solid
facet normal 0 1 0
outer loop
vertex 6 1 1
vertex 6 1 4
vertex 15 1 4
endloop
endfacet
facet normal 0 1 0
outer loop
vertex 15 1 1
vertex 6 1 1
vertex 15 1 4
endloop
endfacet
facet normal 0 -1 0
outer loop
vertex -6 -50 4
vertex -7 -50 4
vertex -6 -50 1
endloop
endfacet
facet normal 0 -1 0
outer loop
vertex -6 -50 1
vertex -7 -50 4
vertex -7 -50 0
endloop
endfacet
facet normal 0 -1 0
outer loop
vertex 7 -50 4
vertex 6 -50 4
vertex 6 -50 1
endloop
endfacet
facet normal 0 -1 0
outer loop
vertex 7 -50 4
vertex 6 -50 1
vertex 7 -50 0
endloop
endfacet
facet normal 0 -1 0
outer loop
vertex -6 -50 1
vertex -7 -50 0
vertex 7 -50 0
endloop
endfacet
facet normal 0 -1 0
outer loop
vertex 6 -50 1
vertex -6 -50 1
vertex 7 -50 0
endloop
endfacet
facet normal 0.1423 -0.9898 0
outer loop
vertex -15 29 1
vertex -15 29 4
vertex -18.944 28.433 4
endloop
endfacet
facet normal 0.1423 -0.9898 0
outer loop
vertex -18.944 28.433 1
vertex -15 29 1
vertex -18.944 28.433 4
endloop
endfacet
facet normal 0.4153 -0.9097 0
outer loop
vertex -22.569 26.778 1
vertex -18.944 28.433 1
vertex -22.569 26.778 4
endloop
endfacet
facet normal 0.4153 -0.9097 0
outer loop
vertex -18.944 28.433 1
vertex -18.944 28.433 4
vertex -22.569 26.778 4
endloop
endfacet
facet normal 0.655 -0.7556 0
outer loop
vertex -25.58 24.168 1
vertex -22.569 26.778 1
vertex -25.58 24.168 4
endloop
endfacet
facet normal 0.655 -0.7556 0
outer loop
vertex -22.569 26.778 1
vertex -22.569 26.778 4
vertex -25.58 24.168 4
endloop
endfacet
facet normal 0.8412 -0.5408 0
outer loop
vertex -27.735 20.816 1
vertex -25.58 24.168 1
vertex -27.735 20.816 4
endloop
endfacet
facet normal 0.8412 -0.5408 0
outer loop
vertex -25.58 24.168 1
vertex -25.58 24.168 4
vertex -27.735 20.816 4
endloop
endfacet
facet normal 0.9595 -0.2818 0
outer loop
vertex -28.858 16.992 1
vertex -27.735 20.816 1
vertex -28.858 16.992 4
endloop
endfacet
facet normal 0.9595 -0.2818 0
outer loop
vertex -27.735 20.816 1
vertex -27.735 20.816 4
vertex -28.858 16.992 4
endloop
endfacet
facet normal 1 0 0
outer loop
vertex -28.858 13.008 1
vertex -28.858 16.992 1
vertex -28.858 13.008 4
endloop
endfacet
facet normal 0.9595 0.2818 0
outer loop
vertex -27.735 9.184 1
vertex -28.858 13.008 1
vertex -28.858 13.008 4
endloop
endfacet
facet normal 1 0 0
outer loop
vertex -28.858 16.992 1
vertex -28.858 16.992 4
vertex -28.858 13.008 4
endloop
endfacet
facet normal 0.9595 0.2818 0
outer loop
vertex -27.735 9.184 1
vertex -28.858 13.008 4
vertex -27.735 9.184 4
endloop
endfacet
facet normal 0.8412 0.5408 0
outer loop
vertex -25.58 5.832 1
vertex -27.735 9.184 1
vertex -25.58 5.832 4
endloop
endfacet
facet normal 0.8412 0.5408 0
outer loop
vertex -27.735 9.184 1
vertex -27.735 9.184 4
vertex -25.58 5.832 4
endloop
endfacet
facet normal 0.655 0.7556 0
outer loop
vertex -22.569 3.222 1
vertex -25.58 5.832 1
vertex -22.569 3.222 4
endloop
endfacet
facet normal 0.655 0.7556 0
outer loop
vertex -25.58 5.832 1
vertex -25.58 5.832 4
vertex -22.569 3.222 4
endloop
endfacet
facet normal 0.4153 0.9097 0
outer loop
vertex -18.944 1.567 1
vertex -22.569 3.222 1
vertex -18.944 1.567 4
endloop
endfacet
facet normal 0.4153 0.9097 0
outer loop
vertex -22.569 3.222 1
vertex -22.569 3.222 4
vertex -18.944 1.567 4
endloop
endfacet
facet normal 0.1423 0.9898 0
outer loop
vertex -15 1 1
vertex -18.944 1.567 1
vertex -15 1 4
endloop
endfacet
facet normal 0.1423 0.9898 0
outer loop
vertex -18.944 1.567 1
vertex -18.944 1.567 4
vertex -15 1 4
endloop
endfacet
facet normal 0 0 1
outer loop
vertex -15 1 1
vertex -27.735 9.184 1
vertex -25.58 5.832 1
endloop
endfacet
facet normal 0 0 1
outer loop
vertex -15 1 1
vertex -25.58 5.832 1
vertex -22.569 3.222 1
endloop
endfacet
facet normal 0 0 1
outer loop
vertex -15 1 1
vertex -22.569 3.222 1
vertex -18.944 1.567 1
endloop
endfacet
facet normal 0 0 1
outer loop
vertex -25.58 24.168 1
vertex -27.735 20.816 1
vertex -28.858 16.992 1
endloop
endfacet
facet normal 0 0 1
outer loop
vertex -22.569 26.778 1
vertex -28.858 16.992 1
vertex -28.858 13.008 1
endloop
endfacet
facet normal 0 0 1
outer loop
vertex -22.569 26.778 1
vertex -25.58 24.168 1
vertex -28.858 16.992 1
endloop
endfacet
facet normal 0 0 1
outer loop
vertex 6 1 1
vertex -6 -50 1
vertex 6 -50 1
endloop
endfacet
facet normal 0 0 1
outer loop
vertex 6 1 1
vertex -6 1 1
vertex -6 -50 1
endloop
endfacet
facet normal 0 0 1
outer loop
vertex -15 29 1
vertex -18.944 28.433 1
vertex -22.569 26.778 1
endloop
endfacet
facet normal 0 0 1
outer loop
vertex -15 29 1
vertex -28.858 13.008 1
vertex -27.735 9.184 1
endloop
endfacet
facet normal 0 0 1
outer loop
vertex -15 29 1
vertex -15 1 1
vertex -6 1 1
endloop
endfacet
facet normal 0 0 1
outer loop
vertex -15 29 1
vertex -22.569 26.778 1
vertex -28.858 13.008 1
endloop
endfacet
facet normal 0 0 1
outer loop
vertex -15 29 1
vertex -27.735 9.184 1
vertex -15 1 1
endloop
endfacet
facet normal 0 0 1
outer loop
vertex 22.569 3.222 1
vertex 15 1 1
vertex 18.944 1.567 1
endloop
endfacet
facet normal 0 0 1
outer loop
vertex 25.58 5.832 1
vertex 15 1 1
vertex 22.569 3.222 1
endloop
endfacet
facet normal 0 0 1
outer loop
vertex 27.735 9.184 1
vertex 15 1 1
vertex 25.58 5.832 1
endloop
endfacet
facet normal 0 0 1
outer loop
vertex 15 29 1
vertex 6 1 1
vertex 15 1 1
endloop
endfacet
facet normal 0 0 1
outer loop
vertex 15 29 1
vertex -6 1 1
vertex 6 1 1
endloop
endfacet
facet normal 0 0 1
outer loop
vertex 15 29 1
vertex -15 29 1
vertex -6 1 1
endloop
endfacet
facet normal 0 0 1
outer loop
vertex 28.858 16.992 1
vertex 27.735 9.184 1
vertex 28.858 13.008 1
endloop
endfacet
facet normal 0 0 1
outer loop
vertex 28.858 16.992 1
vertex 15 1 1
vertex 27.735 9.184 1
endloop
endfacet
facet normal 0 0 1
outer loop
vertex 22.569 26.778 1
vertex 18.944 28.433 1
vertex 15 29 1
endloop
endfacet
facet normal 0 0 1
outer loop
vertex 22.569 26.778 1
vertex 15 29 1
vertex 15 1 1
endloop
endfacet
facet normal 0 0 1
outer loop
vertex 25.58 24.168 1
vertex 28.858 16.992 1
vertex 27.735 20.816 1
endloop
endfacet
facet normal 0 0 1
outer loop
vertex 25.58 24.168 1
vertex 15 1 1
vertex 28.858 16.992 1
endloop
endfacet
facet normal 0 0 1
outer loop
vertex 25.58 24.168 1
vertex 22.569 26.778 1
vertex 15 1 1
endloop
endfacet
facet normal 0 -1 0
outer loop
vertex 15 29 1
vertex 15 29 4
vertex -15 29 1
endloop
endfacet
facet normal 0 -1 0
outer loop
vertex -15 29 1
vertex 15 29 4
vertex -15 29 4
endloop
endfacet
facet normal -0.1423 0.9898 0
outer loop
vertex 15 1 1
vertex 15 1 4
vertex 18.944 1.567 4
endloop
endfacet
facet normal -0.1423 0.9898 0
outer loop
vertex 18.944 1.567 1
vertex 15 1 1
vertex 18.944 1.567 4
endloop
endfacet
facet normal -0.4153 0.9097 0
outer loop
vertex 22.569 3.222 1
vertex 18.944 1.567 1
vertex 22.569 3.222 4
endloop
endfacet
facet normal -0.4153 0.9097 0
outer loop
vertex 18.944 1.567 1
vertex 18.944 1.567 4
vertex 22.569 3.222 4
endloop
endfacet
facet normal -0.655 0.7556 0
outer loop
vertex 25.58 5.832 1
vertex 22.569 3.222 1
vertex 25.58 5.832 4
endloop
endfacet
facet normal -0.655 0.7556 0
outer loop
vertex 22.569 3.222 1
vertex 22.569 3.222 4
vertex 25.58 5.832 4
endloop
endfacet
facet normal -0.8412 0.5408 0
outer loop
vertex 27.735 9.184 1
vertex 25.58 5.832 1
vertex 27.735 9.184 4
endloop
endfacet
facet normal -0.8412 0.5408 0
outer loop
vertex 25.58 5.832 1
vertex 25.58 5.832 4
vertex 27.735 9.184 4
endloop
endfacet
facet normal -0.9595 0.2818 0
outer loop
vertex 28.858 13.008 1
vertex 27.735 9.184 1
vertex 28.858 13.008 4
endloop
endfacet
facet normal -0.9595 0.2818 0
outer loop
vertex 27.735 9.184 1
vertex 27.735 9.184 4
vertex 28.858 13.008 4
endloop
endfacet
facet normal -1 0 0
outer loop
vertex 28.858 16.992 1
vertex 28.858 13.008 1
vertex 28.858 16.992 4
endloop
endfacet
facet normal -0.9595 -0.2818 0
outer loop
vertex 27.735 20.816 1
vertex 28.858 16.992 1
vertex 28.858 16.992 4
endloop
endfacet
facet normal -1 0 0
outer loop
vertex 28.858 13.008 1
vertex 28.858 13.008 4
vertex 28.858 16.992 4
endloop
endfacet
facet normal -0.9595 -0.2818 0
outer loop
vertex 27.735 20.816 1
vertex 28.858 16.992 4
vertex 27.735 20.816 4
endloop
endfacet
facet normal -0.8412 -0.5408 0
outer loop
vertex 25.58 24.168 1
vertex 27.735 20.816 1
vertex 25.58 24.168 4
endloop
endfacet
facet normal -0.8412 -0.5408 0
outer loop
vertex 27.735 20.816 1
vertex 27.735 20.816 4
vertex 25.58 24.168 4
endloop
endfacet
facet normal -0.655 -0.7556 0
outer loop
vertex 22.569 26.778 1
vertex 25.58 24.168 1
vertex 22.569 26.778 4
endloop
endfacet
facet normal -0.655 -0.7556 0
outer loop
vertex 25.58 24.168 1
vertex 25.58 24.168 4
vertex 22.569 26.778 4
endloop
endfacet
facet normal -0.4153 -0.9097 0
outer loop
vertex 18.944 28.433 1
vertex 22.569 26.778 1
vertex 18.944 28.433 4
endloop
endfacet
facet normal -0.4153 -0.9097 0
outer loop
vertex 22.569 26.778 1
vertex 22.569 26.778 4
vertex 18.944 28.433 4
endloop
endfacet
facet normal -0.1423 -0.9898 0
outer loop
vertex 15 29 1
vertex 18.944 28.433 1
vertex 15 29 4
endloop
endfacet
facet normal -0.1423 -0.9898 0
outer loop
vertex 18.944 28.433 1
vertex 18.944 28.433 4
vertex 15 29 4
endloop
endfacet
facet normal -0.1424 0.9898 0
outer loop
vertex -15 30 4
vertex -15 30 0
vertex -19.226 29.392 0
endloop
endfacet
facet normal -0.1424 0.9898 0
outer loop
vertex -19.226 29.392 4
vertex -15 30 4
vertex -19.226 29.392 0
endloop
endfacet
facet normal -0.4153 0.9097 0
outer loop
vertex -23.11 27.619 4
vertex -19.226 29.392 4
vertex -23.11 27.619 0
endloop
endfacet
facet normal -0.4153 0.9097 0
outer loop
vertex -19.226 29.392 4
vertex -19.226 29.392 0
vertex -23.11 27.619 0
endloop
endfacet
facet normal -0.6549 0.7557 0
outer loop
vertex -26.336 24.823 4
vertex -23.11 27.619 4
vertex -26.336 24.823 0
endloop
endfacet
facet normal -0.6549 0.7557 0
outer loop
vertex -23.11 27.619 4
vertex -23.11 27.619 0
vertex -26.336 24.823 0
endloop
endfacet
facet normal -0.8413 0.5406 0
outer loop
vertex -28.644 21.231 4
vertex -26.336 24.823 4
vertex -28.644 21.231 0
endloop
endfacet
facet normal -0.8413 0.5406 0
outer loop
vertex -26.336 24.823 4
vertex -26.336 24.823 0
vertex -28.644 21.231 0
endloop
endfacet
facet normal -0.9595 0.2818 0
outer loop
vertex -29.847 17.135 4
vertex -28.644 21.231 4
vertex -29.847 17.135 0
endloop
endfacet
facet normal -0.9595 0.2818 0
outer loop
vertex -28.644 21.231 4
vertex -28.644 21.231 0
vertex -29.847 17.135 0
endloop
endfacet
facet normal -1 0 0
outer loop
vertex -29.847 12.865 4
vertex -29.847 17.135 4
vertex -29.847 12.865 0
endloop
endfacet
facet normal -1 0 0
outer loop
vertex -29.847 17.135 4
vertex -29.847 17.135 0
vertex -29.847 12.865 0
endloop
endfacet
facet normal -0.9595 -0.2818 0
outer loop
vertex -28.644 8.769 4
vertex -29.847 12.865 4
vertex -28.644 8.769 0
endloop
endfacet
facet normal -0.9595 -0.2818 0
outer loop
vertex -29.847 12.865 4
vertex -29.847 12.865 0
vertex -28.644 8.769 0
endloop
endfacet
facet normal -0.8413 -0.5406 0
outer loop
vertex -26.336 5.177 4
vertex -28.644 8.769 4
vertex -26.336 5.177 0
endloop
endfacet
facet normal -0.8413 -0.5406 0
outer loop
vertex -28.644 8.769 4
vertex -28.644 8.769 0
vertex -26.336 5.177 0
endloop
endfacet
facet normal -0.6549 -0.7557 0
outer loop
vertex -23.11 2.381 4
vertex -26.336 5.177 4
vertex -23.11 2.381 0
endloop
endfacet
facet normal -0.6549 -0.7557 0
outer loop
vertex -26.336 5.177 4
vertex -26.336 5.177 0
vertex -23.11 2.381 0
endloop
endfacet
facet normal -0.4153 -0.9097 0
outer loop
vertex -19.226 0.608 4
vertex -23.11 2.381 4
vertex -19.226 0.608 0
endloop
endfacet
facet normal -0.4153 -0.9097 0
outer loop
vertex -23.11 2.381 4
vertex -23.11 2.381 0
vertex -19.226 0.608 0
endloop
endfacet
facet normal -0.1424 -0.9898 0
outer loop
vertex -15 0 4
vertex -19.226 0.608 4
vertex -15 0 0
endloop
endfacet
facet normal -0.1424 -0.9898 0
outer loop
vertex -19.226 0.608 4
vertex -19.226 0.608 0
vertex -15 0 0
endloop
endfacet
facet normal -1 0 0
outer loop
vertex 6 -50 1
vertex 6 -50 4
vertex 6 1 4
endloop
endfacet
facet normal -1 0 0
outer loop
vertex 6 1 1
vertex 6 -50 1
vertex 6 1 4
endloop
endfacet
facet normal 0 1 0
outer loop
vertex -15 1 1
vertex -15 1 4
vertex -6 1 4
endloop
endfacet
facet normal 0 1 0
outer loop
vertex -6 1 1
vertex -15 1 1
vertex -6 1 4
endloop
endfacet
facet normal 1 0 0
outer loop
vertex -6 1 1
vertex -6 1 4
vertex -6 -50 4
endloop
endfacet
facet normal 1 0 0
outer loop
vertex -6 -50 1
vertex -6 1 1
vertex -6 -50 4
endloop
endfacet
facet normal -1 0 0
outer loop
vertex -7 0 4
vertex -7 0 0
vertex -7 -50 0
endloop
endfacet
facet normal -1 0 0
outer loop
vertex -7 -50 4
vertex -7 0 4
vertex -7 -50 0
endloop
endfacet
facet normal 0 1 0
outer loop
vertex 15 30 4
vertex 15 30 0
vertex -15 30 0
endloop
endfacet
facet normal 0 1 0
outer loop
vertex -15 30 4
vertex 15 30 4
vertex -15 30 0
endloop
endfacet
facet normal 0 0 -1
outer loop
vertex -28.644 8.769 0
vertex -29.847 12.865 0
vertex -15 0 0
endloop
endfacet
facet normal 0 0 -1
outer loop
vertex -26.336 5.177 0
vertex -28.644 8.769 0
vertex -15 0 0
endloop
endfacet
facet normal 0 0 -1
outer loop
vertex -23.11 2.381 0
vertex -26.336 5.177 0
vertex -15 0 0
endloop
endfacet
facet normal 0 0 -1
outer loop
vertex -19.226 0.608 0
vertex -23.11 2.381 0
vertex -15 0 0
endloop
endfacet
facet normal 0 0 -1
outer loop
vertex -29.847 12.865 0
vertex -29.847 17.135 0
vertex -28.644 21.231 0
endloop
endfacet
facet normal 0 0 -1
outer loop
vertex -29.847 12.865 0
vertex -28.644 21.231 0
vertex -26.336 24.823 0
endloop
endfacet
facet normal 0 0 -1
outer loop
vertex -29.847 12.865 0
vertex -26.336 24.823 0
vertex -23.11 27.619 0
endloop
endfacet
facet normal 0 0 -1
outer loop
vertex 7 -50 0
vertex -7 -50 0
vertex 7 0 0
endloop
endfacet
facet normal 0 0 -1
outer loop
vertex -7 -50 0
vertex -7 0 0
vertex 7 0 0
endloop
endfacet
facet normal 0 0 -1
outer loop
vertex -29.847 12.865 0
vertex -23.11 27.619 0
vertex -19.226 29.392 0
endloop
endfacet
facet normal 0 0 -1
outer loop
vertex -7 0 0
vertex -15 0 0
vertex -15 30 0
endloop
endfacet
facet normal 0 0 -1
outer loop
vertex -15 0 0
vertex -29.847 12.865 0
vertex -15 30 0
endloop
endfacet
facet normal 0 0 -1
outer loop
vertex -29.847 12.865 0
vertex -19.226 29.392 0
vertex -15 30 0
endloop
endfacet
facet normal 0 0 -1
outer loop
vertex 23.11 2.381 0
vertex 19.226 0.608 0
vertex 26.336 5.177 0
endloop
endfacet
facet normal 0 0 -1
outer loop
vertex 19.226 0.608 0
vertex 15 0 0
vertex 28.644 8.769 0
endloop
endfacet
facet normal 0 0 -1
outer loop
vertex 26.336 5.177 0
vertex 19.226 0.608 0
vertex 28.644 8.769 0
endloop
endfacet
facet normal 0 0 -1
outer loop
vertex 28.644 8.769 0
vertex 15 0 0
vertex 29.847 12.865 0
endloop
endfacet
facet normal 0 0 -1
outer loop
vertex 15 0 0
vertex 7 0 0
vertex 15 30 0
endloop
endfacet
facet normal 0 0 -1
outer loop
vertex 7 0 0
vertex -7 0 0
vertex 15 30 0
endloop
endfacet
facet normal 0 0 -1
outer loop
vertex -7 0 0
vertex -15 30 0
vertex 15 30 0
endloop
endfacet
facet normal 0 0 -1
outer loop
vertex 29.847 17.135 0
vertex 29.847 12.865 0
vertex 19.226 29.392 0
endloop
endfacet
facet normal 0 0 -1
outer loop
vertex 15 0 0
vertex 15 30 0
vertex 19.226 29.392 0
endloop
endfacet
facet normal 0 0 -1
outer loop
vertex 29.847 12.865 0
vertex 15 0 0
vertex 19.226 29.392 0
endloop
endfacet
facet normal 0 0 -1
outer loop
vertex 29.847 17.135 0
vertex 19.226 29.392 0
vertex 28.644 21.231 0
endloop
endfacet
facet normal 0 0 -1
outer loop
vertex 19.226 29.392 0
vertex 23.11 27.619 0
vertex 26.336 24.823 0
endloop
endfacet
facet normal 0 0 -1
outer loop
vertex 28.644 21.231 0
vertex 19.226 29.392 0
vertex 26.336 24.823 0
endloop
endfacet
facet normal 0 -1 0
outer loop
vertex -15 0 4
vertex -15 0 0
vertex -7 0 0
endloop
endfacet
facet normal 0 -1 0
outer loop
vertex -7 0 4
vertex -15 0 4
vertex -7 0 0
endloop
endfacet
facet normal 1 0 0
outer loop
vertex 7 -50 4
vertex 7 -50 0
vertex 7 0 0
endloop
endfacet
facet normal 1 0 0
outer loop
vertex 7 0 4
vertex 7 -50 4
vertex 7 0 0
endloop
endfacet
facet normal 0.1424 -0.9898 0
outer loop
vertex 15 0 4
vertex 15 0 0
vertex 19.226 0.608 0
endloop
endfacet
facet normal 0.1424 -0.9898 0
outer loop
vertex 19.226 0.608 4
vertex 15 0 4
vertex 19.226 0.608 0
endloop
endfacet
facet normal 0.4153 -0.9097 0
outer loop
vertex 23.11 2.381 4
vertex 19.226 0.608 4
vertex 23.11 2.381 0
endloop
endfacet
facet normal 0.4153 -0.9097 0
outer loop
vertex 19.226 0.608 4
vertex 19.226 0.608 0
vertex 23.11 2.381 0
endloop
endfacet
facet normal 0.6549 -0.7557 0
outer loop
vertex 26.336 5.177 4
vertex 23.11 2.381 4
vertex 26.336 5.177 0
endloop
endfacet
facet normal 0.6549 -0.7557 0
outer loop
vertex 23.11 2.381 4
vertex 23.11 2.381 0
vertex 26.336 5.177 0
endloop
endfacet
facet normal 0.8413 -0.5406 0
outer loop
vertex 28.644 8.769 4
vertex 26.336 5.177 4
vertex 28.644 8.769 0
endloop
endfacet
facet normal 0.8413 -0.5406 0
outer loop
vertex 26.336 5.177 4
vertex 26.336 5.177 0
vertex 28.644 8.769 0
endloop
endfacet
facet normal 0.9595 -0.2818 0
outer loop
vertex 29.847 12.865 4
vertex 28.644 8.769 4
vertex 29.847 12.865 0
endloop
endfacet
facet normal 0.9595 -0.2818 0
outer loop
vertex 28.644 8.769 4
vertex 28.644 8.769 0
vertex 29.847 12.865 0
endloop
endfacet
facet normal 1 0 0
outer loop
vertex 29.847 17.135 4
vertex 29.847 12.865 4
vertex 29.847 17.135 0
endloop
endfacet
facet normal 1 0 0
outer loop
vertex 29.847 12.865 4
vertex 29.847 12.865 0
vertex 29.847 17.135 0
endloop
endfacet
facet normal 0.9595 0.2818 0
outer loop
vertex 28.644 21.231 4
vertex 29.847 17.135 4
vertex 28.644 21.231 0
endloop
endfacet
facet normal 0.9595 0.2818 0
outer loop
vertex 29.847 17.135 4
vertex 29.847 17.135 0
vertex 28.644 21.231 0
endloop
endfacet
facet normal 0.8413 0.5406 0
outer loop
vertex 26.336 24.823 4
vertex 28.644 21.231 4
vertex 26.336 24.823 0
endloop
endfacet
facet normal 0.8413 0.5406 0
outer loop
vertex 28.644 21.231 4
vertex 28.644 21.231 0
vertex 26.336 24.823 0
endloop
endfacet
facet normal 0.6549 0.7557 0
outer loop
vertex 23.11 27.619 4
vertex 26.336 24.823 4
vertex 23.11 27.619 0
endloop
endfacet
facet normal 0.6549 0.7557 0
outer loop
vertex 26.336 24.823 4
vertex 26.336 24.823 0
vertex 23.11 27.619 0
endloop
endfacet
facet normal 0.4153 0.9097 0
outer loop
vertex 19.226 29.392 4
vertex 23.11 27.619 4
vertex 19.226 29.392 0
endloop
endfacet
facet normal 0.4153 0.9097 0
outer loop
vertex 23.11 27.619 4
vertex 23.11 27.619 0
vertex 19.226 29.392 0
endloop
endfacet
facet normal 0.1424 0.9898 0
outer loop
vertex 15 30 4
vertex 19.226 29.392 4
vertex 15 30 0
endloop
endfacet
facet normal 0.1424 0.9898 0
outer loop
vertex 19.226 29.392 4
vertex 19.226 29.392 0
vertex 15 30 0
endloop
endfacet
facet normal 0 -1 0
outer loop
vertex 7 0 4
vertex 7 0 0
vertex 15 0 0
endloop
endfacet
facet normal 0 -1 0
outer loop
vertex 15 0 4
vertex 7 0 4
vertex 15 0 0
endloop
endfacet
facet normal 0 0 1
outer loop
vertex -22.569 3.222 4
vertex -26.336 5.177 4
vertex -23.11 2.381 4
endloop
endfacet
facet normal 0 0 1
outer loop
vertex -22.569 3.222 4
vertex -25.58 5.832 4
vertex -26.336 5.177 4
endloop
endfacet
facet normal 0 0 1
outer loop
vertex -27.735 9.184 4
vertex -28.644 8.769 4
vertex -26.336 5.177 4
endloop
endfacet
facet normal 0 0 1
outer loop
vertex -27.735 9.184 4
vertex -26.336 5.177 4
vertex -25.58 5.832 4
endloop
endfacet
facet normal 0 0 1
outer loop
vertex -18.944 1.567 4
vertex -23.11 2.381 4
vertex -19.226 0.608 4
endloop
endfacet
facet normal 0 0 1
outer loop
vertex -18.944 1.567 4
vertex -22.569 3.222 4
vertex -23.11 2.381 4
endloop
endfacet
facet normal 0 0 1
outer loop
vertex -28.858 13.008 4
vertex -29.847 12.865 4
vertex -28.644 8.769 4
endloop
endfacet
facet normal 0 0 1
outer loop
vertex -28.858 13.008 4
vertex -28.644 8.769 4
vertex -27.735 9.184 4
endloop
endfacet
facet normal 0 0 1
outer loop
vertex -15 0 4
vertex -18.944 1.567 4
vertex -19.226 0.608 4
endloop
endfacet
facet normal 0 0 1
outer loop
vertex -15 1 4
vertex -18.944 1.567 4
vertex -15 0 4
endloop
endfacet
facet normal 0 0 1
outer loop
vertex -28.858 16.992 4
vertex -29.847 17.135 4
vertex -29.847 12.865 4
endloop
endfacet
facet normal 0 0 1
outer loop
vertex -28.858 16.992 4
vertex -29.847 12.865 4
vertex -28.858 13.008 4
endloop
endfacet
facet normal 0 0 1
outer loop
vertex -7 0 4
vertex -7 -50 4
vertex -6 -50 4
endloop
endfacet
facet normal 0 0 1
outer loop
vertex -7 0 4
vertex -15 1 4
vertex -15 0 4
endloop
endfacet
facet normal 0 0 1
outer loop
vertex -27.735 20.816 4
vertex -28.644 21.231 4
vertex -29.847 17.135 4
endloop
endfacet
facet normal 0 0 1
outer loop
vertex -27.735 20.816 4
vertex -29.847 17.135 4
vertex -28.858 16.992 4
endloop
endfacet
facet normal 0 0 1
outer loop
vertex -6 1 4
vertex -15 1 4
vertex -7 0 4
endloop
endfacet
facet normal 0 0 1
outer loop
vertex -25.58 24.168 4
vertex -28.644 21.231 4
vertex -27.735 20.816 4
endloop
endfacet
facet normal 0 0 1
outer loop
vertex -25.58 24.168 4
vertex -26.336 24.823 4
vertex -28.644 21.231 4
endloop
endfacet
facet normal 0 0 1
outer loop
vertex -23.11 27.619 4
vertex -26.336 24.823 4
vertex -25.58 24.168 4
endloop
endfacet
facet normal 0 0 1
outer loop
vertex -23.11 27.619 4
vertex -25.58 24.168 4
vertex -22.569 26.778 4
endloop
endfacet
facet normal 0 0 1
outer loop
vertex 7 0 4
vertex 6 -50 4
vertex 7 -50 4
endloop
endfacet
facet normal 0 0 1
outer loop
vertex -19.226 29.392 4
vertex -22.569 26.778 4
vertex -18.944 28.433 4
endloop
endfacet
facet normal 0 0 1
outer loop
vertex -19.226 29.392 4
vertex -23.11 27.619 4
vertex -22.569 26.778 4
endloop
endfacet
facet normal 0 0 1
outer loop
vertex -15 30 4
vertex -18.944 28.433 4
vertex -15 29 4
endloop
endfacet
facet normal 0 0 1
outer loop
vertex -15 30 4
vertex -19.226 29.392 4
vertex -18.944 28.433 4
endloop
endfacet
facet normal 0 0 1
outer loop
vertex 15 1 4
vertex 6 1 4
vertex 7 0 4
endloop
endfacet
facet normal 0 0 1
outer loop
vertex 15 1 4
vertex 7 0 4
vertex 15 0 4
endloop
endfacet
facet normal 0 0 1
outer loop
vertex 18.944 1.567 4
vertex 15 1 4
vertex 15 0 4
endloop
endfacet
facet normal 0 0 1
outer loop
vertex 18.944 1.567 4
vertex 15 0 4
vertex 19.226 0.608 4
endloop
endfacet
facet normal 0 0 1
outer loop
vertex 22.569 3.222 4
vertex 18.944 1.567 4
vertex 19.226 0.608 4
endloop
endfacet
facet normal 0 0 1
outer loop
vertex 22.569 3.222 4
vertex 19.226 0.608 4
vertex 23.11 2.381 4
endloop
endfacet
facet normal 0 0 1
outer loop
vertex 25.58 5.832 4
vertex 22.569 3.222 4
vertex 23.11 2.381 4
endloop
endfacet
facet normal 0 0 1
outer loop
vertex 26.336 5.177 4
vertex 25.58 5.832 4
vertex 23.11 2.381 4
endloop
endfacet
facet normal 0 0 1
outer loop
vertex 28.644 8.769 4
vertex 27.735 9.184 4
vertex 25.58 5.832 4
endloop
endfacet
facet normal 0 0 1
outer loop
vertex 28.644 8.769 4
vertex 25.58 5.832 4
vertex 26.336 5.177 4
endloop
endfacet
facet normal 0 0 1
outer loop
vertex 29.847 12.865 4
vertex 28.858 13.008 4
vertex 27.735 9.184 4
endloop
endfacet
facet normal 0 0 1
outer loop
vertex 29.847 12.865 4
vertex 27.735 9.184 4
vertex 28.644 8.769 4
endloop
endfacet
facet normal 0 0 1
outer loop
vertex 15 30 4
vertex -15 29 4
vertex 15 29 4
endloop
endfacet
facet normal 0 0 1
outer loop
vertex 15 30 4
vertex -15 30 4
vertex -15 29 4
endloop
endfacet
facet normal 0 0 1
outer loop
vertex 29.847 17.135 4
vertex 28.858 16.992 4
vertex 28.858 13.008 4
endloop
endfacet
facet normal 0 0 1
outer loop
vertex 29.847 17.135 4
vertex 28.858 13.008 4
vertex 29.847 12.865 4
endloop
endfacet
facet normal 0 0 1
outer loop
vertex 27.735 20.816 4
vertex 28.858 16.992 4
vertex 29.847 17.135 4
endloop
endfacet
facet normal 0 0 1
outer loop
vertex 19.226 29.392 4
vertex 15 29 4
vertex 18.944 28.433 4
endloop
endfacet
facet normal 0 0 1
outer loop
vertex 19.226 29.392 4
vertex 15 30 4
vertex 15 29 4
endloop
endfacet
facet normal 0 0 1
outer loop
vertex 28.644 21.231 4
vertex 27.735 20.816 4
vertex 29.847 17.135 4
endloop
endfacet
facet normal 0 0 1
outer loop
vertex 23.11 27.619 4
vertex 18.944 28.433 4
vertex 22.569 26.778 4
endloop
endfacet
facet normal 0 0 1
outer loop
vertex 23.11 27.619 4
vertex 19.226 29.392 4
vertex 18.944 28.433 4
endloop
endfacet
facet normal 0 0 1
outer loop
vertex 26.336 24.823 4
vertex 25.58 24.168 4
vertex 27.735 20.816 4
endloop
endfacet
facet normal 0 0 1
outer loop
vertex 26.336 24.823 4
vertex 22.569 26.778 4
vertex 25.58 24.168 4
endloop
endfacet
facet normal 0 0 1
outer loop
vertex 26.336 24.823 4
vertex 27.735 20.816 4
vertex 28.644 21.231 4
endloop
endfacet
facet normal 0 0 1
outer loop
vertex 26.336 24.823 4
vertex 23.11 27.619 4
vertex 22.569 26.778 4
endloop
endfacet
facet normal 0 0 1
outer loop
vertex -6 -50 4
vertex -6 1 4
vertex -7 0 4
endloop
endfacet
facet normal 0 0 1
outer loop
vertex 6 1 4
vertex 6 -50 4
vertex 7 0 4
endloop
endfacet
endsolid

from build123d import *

# Parameters (mm, degrees)
PAD_DEPTH    = 4
POCKET_DEPTH = 3


with BuildPart() as part:
    # Sketch → Pad (new body)
    with BuildSketch(Plane.XY):
        with BuildLine():
            Line((-7, -50), (7, -50))
            Line((7, -50), (7, 0))
            Line((7, 0), (15, 0))
            ThreePointArc((15, 0), (30, 15), (15, 30))
            Line((15, 30), (-15, 30))
            ThreePointArc((-15, 30), (-30, 15), (-15, 0))
            Line((-15, 0), (-7, 0))
            Line((-7, 0), (-7, -50))
        make_face()
    extrude(amount=PAD_DEPTH)

    # Sketch001 → Pocket (cut)
    with BuildSketch(Plane.XY.offset(4)):
        with BuildLine():
            Line((-6, -50), (6, -50))
            Line((6, -50), (6, 1))
            Line((6, 1), (15, 1))
            ThreePointArc((15, 1), (29, 15), (15, 29))
            Line((15, 29), (-15, 29))
            ThreePointArc((-15, 29), (-29, 15), (-15, 1))
            Line((-15, 1), (-6, 1))
            Line((-6, 1), (-6, -50))
        make_face()
    extrude(amount=-POCKET_DEPTH, mode=Mode.SUBTRACT)


solid = part.part
